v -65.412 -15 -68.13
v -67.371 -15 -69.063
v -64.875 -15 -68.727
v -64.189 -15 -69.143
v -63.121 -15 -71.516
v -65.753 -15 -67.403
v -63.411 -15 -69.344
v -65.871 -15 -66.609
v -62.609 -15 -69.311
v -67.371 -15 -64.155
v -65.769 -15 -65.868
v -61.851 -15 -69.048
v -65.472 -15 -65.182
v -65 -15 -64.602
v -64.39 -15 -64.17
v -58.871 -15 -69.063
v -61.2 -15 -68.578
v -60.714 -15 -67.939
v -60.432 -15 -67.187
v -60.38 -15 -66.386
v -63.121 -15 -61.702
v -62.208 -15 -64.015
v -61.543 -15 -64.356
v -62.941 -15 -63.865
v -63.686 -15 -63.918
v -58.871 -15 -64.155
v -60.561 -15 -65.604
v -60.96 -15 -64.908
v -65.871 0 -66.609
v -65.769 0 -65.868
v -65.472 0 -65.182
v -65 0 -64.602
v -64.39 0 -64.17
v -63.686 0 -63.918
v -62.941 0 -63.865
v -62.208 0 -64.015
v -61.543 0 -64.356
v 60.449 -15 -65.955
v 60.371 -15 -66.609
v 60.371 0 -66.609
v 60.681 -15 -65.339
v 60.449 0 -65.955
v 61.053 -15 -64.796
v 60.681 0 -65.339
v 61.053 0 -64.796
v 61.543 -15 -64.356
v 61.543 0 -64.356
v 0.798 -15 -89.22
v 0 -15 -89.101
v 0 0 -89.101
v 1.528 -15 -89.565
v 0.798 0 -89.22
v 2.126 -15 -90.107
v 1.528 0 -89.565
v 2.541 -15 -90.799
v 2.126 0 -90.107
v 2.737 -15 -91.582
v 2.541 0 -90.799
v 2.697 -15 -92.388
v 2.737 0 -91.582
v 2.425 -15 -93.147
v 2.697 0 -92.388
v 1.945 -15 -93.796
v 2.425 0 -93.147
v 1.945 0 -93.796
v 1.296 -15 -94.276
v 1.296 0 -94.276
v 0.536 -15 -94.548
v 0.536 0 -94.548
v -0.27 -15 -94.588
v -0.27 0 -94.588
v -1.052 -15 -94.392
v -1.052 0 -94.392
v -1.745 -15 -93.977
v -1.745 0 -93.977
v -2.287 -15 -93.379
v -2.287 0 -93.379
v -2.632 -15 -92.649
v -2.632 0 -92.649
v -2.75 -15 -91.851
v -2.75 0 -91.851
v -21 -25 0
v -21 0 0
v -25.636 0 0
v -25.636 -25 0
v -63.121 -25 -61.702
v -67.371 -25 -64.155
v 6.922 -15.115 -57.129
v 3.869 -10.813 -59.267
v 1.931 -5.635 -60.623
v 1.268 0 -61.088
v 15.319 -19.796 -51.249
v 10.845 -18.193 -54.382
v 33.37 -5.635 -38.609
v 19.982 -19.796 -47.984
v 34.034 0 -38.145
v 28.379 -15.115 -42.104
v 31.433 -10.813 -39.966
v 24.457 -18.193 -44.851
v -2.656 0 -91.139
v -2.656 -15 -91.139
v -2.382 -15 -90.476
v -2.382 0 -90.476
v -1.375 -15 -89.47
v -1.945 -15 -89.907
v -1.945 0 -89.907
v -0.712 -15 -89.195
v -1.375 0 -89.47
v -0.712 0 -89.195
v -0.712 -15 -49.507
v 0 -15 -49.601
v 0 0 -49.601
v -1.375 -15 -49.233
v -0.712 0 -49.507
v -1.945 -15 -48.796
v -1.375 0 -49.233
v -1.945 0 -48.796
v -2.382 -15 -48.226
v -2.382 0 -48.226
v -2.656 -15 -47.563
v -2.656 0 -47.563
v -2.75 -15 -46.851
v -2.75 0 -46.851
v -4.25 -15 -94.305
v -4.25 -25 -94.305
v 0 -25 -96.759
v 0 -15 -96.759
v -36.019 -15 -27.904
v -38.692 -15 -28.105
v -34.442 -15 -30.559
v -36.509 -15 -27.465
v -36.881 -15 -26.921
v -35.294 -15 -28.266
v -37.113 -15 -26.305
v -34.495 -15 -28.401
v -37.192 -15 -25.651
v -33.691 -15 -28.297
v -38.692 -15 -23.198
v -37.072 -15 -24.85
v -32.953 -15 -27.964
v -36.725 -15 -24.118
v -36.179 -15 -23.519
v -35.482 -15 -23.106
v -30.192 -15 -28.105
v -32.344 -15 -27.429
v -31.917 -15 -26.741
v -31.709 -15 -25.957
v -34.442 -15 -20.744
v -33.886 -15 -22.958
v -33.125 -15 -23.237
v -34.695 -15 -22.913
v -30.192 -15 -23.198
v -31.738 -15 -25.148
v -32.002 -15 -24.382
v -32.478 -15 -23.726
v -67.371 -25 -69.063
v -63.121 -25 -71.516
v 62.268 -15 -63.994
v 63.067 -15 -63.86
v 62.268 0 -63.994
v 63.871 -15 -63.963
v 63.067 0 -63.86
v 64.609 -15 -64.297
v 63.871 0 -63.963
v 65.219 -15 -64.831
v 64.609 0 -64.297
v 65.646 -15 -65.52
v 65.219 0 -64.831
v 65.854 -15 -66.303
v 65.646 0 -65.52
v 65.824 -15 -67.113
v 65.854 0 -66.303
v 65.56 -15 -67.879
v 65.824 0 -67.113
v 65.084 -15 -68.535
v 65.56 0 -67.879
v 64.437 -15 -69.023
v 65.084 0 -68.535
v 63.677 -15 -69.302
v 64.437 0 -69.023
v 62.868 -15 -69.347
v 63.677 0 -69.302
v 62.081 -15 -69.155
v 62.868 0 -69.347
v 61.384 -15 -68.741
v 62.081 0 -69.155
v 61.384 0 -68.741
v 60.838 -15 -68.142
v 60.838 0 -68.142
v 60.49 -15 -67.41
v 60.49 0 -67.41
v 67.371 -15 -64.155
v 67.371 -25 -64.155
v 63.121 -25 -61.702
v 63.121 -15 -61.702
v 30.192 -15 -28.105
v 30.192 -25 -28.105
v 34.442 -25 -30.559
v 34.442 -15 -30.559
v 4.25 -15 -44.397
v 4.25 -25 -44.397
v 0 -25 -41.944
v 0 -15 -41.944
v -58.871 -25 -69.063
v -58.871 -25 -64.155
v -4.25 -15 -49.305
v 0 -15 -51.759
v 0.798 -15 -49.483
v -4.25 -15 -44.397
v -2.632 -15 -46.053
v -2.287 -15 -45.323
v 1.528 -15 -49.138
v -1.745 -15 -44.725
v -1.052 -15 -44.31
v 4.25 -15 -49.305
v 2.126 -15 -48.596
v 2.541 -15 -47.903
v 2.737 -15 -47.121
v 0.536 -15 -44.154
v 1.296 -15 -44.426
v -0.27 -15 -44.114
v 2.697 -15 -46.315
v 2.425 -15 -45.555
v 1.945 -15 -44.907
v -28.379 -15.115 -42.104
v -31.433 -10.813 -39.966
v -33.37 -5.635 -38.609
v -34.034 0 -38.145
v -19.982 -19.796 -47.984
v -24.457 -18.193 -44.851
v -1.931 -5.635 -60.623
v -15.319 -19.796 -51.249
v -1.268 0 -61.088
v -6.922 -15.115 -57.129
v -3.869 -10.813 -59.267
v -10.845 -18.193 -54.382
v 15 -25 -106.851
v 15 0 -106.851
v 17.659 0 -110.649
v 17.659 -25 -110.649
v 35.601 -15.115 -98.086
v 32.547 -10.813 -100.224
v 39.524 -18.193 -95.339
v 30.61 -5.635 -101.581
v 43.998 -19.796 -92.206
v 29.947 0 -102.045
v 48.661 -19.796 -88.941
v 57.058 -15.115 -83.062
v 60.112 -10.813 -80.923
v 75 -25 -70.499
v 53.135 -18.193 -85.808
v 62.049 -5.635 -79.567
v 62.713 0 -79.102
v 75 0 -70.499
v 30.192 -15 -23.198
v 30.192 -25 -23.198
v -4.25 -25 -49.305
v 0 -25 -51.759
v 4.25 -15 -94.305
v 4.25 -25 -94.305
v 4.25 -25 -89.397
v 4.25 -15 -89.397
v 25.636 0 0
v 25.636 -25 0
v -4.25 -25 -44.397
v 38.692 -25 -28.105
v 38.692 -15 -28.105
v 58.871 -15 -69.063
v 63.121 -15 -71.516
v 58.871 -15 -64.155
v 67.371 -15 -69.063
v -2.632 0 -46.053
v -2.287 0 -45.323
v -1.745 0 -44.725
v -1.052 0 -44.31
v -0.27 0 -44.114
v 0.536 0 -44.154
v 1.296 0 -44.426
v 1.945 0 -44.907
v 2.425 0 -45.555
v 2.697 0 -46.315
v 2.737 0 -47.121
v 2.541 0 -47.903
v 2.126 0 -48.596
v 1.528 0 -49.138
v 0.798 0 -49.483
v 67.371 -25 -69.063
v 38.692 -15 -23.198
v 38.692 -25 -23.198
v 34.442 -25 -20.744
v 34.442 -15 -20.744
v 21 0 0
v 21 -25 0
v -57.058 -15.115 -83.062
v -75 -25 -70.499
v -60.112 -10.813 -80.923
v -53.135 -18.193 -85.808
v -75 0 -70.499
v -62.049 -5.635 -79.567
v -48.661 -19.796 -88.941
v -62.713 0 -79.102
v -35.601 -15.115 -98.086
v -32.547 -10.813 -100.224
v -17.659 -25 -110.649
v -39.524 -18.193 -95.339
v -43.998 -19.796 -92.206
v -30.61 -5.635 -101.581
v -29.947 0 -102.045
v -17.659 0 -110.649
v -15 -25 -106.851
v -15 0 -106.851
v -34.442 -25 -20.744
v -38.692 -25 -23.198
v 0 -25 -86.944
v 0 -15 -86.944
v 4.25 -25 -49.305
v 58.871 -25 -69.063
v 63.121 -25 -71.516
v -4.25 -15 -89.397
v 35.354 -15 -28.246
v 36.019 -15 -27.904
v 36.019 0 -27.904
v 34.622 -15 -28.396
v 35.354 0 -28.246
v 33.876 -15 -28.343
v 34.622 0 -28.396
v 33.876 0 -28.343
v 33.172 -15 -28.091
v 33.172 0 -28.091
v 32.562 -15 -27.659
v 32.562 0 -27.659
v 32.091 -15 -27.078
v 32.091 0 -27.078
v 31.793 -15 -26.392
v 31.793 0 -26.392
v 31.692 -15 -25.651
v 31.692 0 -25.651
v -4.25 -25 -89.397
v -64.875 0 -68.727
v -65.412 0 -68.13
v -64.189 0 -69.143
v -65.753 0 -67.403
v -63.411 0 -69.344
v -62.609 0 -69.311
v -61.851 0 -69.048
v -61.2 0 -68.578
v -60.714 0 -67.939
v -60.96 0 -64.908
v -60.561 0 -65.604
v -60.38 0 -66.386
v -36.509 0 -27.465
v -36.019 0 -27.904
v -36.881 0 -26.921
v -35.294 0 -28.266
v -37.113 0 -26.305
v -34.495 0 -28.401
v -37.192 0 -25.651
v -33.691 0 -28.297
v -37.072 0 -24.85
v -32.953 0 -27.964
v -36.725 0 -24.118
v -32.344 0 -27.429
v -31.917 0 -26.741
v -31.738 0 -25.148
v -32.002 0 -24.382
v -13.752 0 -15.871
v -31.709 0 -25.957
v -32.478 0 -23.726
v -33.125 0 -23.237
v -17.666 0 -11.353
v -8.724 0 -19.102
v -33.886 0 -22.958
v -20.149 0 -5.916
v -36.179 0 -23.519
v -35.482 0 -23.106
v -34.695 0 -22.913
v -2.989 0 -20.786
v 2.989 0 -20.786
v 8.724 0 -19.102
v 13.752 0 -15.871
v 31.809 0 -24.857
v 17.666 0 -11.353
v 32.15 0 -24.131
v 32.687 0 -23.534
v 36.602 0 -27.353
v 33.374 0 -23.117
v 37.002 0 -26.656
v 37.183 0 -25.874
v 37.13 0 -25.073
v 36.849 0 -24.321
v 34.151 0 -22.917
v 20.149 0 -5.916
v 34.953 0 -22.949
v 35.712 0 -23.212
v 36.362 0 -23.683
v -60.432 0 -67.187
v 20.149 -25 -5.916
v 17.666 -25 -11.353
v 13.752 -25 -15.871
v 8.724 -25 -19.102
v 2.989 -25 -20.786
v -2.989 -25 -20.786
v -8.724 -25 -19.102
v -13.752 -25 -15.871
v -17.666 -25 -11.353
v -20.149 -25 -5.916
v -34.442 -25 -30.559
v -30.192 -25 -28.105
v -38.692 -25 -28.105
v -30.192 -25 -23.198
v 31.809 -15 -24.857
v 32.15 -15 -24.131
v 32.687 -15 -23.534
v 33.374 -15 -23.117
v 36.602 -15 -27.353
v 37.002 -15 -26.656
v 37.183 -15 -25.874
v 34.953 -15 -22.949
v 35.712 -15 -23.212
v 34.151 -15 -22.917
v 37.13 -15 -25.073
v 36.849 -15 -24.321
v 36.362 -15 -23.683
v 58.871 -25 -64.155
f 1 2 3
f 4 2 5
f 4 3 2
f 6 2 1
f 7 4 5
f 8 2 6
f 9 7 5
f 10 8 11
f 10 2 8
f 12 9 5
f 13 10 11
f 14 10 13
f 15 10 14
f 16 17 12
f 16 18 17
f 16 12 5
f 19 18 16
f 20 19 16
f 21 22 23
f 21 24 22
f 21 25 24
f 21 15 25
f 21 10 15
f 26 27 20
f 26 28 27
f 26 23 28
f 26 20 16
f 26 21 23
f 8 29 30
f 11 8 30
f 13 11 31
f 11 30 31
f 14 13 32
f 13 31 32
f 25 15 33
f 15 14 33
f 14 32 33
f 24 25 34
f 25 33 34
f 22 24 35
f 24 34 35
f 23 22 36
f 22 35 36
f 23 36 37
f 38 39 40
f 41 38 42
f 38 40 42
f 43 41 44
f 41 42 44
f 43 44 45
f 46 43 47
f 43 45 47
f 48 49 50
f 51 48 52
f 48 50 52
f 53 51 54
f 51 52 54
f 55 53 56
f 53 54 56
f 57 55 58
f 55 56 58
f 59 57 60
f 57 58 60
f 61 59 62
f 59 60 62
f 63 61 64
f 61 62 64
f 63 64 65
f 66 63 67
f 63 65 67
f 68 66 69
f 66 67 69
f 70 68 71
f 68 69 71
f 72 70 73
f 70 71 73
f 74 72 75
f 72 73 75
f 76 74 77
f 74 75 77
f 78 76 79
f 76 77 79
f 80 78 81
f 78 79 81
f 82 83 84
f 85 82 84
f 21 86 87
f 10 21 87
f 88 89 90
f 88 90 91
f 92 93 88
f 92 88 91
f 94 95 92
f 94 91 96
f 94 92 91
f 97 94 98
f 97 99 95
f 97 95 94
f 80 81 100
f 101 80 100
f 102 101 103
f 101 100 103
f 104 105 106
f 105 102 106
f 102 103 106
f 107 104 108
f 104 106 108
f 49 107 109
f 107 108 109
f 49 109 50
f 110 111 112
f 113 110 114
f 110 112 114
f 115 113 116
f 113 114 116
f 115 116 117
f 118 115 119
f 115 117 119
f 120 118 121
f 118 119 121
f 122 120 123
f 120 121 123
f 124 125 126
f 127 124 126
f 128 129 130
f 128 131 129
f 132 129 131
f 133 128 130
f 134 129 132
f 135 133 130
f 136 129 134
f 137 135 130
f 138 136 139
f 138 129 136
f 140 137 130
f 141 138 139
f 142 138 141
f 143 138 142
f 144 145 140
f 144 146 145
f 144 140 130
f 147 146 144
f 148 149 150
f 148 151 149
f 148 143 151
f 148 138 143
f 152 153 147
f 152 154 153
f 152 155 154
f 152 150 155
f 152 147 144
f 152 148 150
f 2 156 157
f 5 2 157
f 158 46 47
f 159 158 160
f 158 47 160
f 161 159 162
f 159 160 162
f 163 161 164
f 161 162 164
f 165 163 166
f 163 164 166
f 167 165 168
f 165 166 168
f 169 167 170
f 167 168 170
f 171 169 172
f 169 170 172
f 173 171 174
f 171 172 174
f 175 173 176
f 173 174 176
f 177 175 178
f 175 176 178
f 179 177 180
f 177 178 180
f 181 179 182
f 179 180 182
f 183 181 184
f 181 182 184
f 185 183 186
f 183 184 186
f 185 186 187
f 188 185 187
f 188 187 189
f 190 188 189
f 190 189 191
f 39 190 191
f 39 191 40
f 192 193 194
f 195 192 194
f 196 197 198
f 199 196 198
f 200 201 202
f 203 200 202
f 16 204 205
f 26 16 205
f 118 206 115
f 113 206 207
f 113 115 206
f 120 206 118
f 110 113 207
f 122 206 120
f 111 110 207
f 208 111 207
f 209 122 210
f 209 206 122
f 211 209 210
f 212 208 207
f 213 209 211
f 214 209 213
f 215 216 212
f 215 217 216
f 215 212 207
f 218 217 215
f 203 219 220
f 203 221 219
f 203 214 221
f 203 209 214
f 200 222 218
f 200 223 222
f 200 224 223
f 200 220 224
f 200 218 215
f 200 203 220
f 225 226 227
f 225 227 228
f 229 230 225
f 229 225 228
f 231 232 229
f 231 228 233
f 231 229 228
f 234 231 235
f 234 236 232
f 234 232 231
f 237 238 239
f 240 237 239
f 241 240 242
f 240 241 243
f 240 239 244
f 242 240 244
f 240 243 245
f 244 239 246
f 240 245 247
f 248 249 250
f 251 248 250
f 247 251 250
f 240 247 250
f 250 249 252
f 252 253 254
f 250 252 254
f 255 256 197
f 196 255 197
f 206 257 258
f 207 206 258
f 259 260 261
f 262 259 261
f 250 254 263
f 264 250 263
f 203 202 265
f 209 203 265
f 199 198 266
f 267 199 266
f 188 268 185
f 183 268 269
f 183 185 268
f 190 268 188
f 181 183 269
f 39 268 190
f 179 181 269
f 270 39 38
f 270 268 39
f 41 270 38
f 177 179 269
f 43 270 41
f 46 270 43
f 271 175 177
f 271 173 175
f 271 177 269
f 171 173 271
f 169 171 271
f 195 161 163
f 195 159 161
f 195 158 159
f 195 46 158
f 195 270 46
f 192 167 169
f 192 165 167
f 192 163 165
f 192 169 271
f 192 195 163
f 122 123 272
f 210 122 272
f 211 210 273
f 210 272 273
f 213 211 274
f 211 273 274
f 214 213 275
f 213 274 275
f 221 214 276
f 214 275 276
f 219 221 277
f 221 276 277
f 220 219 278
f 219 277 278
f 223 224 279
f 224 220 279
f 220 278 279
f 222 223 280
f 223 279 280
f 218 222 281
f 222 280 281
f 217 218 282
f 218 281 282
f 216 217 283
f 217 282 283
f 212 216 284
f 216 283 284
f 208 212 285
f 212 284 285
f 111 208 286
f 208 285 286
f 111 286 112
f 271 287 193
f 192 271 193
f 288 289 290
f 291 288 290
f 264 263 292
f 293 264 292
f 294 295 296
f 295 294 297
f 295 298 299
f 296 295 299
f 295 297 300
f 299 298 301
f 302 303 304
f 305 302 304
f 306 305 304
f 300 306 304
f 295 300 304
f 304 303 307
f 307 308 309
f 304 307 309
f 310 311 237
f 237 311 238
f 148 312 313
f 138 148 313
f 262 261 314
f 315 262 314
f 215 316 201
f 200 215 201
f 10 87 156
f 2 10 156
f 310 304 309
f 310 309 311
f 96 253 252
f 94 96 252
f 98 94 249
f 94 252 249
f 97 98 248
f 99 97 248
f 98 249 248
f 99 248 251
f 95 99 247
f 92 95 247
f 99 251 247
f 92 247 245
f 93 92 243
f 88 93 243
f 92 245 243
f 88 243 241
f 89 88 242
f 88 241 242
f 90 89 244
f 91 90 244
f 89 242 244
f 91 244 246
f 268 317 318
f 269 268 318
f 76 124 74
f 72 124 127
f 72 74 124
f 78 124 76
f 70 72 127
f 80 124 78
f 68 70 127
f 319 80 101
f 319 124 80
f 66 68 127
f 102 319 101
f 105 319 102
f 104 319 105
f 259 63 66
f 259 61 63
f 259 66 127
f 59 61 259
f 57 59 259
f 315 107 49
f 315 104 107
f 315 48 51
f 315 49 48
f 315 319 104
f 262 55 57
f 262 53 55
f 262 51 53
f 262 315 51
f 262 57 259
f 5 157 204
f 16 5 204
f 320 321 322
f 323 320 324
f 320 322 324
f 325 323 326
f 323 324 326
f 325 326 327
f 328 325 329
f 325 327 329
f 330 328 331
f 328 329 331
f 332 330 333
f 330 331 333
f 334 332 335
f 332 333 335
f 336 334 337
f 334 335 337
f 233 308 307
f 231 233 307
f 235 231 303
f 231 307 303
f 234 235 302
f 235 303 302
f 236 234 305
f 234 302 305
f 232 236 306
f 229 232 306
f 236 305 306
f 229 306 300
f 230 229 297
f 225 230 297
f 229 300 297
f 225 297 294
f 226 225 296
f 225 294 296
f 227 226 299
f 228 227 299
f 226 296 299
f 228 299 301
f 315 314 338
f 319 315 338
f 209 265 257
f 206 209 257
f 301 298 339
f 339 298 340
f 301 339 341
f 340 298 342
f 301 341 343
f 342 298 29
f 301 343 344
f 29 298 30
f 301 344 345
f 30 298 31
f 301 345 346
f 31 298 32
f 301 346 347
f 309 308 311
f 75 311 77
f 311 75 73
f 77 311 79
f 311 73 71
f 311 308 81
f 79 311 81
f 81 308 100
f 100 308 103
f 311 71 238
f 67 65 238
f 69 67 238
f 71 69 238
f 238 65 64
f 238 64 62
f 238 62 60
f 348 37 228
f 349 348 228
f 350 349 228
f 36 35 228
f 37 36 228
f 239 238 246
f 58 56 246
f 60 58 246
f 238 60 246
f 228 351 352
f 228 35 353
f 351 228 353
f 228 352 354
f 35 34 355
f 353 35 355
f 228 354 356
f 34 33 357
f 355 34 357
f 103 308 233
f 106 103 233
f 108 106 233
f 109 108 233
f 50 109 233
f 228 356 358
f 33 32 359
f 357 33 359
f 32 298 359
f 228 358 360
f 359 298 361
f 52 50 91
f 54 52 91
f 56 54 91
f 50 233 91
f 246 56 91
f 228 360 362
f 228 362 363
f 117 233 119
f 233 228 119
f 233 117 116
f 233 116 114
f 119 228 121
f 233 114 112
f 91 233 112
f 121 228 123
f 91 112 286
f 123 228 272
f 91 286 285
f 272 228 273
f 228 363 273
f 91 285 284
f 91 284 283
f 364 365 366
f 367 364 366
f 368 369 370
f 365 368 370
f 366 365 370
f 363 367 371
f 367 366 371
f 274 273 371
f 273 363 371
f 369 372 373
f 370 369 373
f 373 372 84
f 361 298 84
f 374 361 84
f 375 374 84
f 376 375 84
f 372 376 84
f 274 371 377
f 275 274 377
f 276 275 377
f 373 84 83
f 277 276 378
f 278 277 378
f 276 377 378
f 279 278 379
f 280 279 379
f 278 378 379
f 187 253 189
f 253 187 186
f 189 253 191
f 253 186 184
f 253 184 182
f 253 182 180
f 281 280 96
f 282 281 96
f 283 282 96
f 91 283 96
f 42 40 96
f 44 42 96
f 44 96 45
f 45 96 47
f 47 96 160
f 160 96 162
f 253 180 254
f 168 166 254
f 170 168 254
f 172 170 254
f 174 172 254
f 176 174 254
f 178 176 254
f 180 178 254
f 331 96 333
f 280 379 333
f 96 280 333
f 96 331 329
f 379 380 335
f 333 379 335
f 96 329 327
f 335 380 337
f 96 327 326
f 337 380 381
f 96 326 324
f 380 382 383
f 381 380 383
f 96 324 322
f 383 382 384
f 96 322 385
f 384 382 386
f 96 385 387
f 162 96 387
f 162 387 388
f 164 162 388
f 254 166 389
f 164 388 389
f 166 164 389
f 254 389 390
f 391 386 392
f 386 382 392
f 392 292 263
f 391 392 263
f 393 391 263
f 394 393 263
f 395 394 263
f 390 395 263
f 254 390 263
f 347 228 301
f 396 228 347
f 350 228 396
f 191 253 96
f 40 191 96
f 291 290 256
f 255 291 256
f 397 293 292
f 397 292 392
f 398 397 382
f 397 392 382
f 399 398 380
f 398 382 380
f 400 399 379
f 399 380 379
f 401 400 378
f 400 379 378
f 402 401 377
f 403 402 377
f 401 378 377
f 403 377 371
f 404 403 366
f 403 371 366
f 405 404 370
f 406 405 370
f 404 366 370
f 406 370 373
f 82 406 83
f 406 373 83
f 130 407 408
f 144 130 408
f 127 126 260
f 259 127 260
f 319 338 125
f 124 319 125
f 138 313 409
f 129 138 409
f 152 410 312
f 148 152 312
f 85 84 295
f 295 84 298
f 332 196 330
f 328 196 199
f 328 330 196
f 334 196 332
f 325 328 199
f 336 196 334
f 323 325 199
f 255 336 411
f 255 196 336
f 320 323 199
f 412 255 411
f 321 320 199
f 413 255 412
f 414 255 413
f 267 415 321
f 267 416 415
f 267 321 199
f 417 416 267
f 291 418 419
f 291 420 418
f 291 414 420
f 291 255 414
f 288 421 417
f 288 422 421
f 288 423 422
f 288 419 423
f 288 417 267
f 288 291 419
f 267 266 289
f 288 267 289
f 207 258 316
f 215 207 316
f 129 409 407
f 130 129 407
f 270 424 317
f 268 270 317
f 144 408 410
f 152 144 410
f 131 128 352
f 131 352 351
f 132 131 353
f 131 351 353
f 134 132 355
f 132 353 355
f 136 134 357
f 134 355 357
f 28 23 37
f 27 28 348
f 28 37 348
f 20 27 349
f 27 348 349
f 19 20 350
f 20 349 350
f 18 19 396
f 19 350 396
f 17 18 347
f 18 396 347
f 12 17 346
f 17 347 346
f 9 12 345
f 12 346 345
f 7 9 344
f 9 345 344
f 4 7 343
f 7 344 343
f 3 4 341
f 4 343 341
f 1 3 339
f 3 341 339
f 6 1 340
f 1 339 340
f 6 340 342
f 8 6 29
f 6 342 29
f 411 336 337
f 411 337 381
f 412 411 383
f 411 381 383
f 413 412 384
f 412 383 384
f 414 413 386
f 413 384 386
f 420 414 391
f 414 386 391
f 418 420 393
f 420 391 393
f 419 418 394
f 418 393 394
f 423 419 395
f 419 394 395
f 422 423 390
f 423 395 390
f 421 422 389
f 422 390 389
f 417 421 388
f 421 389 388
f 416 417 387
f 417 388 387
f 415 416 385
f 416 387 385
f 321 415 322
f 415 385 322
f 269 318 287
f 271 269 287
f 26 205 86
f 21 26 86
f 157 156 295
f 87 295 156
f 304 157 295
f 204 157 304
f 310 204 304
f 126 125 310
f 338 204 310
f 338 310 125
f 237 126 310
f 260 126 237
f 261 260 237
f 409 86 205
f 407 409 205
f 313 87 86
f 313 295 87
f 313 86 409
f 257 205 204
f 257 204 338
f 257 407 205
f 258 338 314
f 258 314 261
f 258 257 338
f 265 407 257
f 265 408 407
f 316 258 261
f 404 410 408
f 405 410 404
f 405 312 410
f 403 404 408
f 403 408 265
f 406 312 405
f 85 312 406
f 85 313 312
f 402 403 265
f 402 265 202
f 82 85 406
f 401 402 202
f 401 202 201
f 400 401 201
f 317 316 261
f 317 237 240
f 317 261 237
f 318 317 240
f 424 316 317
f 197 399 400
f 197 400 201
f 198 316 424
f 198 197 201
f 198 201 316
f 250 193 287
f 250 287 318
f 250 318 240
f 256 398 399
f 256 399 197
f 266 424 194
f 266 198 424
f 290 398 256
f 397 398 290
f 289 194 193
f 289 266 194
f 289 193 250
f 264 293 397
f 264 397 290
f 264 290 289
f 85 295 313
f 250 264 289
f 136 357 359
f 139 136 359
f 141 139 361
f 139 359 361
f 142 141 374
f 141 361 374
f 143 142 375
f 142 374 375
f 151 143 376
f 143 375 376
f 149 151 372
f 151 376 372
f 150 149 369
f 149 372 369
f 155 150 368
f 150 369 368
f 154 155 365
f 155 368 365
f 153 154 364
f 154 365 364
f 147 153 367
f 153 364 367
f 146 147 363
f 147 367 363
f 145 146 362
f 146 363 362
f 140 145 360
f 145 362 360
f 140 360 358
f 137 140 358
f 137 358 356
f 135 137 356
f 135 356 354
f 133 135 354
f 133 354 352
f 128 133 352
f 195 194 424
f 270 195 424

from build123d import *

# Parameters (mm, degrees)
F1_DEPTH = 25
F3_DEPTH = 50
F5_DEPTH = 50
F7_DEPTH = 25.001
F8_R     = 2.75
F9_DEPTH = 10


with BuildPart() as f1:
    # F0 (on Front) → F1 (new body)
    with BuildSketch(Plane.XZ):
        with BuildLine():
            Line((25.636266364, 0), (21, 0))
            ThreePointArc((21, 0), (0, -21), (-21, 0))
            Line((-21, 0), (-25.636266364, 0))
            Line((-25.636266364, 0), (-75, -70.4987177976))
            Line((-75, -70.4987177976), (-17.6593568998, -110.6490683422))
            Line((-17.6593568998, -110.6490683422), (-15, -106.8511130866))
            Line((-15, -106.8511130866), (15, -106.8511130866))
            Line((15, -106.8511130866), (17.6593568998, -110.6490683422))
            Line((17.6593568998, -110.6490683422), (75, -70.4987177976))
            Line((75, -70.4987177976), (25.636266364, 0))
        make_face()
    extrude(amount=F1_DEPTH)

    # F2 (on face) → F3 (cut)
    with BuildSketch(Plane(origin=(-57.7978070699, 0, -82.543822961), x_dir=(0.8191520443, 0, -0.5735764364), z_dir=(-0.5735764364, 0, -0.8191520443))):
        with BuildLine():
            ThreePointArc((34, 0), (14, 20), (-6, 0))
            Line((-6, 0), (34, 0))
        make_face()
    extrude(amount=-F3_DEPTH, mode=Mode.SUBTRACT)

    # F4 (on face) → F5 (cut)
    with BuildSketch(Plane(origin=(57.7978070699, 0, -82.543822961), x_dir=(0.8191520443, 0, 0.5735764364), z_dir=(0.5735764364, 0, -0.8191520443))):
        with BuildLine():
            ThreePointArc((6, 0), (-14, 20), (-34, 0))
            Line((-34, 0), (6, 0))
        make_face()
    extrude(amount=-F5_DEPTH, mode=Mode.SUBTRACT)

    # F6 (on face) → F7 (cut, through all)
    with BuildSketch(Plane(origin=(0, 0, 0), x_dir=(-1, 0, 0), z_dir=(0, 1, 0))):
        with BuildLine():
            ThreePointArc((-61.5432601044, -64.3563525056), (-65.5598750956, -67.8788293138), (-60.3705953043, -66.6090206274))
            ThreePointArc((-60.3705953043, -66.6090206274), (-60.6813155131, -65.339211941), (-61.5432601044, -64.3563525056))
        make_face()
        with BuildLine():
            ThreePointArc((36.0191086867, -27.9040865347), (36.881053278, -26.9212270993), (37.1917734868, -25.6514184129))
            ThreePointArc((37.1917734868, -25.6514184129), (32.0024936955, -24.3816097265), (36.0191086867, -27.9040865347))
        make_face()
        with BuildLine():
            ThreePointArc((65.8705953043, -66.6090206274), (64.3904039907, -64.1697408361), (61.5432601044, -64.3563525056))
            ThreePointArc((61.5432601044, -64.3563525056), (61.8507866179, -69.0483004186), (65.8705953043, -66.6090206274))
        make_face()
        with BuildLine():
            ThreePointArc((0, -49.6011130866), (1.9445436483, -48.7956567348), (2.75, -46.8511130866))
            ThreePointArc((2.75, -46.8511130866), (-1.9445436483, -44.9065694383), (0, -49.6011130866))
        make_face()
        with BuildLine():
            ThreePointArc((2.75, -91.8511130866), (1.9445436483, -89.9065694383), (0, -89.1011130866))
            ThreePointArc((0, -89.1011130866), (-1.9445436483, -93.7956567348), (2.75, -91.8511130866))
        make_face()
        with BuildLine():
            ThreePointArc((-31.6917734868, -25.6514184129), (-35.7115821732, -23.2121386217), (-36.0191086867, -27.9040865347))
            ThreePointArc((-36.0191086867, -27.9040865347), (-33.1719648004, -28.0906982041), (-31.6917734868, -25.6514184129))
        make_face()
    extrude(amount=-F7_DEPTH, mode=Mode.SUBTRACT)

    # F8 (on face) → F9 (cut)
    with BuildSketch(Plane.XZ.offset(25)):
        Polygon((-30.1917734868, -28.105157057), (-30.1917734868, -23.1976797689), (-34.4417734868, -20.7439411248), (-38.6917734868, -23.1976797689), (-38.6917734868, -28.105157057), (-34.4417734868, -30.558895701), align=None)
        with Locations((-34.4417734868, -25.6514184129)):
            Circle(F8_R, mode=Mode.SUBTRACT)
        Polygon((-58.8705953043, -69.0627592714), (-58.8705953043, -64.1552819833), (-63.1205953043, -61.7015433392), (-67.3705953043, -64.1552819833), (-67.3705953043, -69.0627592714), (-63.1205953043, -71.5164979155), align=None)
        with Locations((-63.1205953043, -66.6090206274)):
            Circle(F8_R, mode=Mode.SUBTRACT)
        Polygon((4.25, -94.3048517306), (4.25, -89.3973744425), (0, -86.9436357985), (-4.25, -89.3973744425), (-4.25, -94.3048517306), (0, -96.7585903747), align=None)
        with Locations((0, -91.8511130866)):
            Circle(F8_R, mode=Mode.SUBTRACT)
        Polygon((4.25, -49.3048517306), (4.25, -44.3973744425), (0, -41.9436357985), (-4.25, -44.3973744425), (-4.25, -49.3048517306), (0, -51.7585903747), align=None)
        with Locations((0, -46.8511130866)):
            Circle(F8_R, mode=Mode.SUBTRACT)
        Polygon((30.1917734868, -23.1976797689), (30.1917734868, -28.105157057), (34.4417734868, -30.558895701), (38.6917734868, -28.105157057), (38.6917734868, -23.1976797689), (34.4417734868, -20.7439411248), align=None)
        with Locations((34.4417734868, -25.6514184129)):
            Circle(F8_R, mode=Mode.SUBTRACT)
        Polygon((58.8705953043, -64.1552819833), (58.8705953043, -69.0627592714), (63.1205953043, -71.5164979155), (67.3705953043, -69.0627592714), (67.3705953043, -64.1552819833), (63.1205953043, -61.7015433392), align=None)
        with Locations((63.1205953043, -66.6090206274)):
            Circle(F8_R, mode=Mode.SUBTRACT)
    extrude(amount=-F9_DEPTH, mode=Mode.SUBTRACT)


solid = f1.part
